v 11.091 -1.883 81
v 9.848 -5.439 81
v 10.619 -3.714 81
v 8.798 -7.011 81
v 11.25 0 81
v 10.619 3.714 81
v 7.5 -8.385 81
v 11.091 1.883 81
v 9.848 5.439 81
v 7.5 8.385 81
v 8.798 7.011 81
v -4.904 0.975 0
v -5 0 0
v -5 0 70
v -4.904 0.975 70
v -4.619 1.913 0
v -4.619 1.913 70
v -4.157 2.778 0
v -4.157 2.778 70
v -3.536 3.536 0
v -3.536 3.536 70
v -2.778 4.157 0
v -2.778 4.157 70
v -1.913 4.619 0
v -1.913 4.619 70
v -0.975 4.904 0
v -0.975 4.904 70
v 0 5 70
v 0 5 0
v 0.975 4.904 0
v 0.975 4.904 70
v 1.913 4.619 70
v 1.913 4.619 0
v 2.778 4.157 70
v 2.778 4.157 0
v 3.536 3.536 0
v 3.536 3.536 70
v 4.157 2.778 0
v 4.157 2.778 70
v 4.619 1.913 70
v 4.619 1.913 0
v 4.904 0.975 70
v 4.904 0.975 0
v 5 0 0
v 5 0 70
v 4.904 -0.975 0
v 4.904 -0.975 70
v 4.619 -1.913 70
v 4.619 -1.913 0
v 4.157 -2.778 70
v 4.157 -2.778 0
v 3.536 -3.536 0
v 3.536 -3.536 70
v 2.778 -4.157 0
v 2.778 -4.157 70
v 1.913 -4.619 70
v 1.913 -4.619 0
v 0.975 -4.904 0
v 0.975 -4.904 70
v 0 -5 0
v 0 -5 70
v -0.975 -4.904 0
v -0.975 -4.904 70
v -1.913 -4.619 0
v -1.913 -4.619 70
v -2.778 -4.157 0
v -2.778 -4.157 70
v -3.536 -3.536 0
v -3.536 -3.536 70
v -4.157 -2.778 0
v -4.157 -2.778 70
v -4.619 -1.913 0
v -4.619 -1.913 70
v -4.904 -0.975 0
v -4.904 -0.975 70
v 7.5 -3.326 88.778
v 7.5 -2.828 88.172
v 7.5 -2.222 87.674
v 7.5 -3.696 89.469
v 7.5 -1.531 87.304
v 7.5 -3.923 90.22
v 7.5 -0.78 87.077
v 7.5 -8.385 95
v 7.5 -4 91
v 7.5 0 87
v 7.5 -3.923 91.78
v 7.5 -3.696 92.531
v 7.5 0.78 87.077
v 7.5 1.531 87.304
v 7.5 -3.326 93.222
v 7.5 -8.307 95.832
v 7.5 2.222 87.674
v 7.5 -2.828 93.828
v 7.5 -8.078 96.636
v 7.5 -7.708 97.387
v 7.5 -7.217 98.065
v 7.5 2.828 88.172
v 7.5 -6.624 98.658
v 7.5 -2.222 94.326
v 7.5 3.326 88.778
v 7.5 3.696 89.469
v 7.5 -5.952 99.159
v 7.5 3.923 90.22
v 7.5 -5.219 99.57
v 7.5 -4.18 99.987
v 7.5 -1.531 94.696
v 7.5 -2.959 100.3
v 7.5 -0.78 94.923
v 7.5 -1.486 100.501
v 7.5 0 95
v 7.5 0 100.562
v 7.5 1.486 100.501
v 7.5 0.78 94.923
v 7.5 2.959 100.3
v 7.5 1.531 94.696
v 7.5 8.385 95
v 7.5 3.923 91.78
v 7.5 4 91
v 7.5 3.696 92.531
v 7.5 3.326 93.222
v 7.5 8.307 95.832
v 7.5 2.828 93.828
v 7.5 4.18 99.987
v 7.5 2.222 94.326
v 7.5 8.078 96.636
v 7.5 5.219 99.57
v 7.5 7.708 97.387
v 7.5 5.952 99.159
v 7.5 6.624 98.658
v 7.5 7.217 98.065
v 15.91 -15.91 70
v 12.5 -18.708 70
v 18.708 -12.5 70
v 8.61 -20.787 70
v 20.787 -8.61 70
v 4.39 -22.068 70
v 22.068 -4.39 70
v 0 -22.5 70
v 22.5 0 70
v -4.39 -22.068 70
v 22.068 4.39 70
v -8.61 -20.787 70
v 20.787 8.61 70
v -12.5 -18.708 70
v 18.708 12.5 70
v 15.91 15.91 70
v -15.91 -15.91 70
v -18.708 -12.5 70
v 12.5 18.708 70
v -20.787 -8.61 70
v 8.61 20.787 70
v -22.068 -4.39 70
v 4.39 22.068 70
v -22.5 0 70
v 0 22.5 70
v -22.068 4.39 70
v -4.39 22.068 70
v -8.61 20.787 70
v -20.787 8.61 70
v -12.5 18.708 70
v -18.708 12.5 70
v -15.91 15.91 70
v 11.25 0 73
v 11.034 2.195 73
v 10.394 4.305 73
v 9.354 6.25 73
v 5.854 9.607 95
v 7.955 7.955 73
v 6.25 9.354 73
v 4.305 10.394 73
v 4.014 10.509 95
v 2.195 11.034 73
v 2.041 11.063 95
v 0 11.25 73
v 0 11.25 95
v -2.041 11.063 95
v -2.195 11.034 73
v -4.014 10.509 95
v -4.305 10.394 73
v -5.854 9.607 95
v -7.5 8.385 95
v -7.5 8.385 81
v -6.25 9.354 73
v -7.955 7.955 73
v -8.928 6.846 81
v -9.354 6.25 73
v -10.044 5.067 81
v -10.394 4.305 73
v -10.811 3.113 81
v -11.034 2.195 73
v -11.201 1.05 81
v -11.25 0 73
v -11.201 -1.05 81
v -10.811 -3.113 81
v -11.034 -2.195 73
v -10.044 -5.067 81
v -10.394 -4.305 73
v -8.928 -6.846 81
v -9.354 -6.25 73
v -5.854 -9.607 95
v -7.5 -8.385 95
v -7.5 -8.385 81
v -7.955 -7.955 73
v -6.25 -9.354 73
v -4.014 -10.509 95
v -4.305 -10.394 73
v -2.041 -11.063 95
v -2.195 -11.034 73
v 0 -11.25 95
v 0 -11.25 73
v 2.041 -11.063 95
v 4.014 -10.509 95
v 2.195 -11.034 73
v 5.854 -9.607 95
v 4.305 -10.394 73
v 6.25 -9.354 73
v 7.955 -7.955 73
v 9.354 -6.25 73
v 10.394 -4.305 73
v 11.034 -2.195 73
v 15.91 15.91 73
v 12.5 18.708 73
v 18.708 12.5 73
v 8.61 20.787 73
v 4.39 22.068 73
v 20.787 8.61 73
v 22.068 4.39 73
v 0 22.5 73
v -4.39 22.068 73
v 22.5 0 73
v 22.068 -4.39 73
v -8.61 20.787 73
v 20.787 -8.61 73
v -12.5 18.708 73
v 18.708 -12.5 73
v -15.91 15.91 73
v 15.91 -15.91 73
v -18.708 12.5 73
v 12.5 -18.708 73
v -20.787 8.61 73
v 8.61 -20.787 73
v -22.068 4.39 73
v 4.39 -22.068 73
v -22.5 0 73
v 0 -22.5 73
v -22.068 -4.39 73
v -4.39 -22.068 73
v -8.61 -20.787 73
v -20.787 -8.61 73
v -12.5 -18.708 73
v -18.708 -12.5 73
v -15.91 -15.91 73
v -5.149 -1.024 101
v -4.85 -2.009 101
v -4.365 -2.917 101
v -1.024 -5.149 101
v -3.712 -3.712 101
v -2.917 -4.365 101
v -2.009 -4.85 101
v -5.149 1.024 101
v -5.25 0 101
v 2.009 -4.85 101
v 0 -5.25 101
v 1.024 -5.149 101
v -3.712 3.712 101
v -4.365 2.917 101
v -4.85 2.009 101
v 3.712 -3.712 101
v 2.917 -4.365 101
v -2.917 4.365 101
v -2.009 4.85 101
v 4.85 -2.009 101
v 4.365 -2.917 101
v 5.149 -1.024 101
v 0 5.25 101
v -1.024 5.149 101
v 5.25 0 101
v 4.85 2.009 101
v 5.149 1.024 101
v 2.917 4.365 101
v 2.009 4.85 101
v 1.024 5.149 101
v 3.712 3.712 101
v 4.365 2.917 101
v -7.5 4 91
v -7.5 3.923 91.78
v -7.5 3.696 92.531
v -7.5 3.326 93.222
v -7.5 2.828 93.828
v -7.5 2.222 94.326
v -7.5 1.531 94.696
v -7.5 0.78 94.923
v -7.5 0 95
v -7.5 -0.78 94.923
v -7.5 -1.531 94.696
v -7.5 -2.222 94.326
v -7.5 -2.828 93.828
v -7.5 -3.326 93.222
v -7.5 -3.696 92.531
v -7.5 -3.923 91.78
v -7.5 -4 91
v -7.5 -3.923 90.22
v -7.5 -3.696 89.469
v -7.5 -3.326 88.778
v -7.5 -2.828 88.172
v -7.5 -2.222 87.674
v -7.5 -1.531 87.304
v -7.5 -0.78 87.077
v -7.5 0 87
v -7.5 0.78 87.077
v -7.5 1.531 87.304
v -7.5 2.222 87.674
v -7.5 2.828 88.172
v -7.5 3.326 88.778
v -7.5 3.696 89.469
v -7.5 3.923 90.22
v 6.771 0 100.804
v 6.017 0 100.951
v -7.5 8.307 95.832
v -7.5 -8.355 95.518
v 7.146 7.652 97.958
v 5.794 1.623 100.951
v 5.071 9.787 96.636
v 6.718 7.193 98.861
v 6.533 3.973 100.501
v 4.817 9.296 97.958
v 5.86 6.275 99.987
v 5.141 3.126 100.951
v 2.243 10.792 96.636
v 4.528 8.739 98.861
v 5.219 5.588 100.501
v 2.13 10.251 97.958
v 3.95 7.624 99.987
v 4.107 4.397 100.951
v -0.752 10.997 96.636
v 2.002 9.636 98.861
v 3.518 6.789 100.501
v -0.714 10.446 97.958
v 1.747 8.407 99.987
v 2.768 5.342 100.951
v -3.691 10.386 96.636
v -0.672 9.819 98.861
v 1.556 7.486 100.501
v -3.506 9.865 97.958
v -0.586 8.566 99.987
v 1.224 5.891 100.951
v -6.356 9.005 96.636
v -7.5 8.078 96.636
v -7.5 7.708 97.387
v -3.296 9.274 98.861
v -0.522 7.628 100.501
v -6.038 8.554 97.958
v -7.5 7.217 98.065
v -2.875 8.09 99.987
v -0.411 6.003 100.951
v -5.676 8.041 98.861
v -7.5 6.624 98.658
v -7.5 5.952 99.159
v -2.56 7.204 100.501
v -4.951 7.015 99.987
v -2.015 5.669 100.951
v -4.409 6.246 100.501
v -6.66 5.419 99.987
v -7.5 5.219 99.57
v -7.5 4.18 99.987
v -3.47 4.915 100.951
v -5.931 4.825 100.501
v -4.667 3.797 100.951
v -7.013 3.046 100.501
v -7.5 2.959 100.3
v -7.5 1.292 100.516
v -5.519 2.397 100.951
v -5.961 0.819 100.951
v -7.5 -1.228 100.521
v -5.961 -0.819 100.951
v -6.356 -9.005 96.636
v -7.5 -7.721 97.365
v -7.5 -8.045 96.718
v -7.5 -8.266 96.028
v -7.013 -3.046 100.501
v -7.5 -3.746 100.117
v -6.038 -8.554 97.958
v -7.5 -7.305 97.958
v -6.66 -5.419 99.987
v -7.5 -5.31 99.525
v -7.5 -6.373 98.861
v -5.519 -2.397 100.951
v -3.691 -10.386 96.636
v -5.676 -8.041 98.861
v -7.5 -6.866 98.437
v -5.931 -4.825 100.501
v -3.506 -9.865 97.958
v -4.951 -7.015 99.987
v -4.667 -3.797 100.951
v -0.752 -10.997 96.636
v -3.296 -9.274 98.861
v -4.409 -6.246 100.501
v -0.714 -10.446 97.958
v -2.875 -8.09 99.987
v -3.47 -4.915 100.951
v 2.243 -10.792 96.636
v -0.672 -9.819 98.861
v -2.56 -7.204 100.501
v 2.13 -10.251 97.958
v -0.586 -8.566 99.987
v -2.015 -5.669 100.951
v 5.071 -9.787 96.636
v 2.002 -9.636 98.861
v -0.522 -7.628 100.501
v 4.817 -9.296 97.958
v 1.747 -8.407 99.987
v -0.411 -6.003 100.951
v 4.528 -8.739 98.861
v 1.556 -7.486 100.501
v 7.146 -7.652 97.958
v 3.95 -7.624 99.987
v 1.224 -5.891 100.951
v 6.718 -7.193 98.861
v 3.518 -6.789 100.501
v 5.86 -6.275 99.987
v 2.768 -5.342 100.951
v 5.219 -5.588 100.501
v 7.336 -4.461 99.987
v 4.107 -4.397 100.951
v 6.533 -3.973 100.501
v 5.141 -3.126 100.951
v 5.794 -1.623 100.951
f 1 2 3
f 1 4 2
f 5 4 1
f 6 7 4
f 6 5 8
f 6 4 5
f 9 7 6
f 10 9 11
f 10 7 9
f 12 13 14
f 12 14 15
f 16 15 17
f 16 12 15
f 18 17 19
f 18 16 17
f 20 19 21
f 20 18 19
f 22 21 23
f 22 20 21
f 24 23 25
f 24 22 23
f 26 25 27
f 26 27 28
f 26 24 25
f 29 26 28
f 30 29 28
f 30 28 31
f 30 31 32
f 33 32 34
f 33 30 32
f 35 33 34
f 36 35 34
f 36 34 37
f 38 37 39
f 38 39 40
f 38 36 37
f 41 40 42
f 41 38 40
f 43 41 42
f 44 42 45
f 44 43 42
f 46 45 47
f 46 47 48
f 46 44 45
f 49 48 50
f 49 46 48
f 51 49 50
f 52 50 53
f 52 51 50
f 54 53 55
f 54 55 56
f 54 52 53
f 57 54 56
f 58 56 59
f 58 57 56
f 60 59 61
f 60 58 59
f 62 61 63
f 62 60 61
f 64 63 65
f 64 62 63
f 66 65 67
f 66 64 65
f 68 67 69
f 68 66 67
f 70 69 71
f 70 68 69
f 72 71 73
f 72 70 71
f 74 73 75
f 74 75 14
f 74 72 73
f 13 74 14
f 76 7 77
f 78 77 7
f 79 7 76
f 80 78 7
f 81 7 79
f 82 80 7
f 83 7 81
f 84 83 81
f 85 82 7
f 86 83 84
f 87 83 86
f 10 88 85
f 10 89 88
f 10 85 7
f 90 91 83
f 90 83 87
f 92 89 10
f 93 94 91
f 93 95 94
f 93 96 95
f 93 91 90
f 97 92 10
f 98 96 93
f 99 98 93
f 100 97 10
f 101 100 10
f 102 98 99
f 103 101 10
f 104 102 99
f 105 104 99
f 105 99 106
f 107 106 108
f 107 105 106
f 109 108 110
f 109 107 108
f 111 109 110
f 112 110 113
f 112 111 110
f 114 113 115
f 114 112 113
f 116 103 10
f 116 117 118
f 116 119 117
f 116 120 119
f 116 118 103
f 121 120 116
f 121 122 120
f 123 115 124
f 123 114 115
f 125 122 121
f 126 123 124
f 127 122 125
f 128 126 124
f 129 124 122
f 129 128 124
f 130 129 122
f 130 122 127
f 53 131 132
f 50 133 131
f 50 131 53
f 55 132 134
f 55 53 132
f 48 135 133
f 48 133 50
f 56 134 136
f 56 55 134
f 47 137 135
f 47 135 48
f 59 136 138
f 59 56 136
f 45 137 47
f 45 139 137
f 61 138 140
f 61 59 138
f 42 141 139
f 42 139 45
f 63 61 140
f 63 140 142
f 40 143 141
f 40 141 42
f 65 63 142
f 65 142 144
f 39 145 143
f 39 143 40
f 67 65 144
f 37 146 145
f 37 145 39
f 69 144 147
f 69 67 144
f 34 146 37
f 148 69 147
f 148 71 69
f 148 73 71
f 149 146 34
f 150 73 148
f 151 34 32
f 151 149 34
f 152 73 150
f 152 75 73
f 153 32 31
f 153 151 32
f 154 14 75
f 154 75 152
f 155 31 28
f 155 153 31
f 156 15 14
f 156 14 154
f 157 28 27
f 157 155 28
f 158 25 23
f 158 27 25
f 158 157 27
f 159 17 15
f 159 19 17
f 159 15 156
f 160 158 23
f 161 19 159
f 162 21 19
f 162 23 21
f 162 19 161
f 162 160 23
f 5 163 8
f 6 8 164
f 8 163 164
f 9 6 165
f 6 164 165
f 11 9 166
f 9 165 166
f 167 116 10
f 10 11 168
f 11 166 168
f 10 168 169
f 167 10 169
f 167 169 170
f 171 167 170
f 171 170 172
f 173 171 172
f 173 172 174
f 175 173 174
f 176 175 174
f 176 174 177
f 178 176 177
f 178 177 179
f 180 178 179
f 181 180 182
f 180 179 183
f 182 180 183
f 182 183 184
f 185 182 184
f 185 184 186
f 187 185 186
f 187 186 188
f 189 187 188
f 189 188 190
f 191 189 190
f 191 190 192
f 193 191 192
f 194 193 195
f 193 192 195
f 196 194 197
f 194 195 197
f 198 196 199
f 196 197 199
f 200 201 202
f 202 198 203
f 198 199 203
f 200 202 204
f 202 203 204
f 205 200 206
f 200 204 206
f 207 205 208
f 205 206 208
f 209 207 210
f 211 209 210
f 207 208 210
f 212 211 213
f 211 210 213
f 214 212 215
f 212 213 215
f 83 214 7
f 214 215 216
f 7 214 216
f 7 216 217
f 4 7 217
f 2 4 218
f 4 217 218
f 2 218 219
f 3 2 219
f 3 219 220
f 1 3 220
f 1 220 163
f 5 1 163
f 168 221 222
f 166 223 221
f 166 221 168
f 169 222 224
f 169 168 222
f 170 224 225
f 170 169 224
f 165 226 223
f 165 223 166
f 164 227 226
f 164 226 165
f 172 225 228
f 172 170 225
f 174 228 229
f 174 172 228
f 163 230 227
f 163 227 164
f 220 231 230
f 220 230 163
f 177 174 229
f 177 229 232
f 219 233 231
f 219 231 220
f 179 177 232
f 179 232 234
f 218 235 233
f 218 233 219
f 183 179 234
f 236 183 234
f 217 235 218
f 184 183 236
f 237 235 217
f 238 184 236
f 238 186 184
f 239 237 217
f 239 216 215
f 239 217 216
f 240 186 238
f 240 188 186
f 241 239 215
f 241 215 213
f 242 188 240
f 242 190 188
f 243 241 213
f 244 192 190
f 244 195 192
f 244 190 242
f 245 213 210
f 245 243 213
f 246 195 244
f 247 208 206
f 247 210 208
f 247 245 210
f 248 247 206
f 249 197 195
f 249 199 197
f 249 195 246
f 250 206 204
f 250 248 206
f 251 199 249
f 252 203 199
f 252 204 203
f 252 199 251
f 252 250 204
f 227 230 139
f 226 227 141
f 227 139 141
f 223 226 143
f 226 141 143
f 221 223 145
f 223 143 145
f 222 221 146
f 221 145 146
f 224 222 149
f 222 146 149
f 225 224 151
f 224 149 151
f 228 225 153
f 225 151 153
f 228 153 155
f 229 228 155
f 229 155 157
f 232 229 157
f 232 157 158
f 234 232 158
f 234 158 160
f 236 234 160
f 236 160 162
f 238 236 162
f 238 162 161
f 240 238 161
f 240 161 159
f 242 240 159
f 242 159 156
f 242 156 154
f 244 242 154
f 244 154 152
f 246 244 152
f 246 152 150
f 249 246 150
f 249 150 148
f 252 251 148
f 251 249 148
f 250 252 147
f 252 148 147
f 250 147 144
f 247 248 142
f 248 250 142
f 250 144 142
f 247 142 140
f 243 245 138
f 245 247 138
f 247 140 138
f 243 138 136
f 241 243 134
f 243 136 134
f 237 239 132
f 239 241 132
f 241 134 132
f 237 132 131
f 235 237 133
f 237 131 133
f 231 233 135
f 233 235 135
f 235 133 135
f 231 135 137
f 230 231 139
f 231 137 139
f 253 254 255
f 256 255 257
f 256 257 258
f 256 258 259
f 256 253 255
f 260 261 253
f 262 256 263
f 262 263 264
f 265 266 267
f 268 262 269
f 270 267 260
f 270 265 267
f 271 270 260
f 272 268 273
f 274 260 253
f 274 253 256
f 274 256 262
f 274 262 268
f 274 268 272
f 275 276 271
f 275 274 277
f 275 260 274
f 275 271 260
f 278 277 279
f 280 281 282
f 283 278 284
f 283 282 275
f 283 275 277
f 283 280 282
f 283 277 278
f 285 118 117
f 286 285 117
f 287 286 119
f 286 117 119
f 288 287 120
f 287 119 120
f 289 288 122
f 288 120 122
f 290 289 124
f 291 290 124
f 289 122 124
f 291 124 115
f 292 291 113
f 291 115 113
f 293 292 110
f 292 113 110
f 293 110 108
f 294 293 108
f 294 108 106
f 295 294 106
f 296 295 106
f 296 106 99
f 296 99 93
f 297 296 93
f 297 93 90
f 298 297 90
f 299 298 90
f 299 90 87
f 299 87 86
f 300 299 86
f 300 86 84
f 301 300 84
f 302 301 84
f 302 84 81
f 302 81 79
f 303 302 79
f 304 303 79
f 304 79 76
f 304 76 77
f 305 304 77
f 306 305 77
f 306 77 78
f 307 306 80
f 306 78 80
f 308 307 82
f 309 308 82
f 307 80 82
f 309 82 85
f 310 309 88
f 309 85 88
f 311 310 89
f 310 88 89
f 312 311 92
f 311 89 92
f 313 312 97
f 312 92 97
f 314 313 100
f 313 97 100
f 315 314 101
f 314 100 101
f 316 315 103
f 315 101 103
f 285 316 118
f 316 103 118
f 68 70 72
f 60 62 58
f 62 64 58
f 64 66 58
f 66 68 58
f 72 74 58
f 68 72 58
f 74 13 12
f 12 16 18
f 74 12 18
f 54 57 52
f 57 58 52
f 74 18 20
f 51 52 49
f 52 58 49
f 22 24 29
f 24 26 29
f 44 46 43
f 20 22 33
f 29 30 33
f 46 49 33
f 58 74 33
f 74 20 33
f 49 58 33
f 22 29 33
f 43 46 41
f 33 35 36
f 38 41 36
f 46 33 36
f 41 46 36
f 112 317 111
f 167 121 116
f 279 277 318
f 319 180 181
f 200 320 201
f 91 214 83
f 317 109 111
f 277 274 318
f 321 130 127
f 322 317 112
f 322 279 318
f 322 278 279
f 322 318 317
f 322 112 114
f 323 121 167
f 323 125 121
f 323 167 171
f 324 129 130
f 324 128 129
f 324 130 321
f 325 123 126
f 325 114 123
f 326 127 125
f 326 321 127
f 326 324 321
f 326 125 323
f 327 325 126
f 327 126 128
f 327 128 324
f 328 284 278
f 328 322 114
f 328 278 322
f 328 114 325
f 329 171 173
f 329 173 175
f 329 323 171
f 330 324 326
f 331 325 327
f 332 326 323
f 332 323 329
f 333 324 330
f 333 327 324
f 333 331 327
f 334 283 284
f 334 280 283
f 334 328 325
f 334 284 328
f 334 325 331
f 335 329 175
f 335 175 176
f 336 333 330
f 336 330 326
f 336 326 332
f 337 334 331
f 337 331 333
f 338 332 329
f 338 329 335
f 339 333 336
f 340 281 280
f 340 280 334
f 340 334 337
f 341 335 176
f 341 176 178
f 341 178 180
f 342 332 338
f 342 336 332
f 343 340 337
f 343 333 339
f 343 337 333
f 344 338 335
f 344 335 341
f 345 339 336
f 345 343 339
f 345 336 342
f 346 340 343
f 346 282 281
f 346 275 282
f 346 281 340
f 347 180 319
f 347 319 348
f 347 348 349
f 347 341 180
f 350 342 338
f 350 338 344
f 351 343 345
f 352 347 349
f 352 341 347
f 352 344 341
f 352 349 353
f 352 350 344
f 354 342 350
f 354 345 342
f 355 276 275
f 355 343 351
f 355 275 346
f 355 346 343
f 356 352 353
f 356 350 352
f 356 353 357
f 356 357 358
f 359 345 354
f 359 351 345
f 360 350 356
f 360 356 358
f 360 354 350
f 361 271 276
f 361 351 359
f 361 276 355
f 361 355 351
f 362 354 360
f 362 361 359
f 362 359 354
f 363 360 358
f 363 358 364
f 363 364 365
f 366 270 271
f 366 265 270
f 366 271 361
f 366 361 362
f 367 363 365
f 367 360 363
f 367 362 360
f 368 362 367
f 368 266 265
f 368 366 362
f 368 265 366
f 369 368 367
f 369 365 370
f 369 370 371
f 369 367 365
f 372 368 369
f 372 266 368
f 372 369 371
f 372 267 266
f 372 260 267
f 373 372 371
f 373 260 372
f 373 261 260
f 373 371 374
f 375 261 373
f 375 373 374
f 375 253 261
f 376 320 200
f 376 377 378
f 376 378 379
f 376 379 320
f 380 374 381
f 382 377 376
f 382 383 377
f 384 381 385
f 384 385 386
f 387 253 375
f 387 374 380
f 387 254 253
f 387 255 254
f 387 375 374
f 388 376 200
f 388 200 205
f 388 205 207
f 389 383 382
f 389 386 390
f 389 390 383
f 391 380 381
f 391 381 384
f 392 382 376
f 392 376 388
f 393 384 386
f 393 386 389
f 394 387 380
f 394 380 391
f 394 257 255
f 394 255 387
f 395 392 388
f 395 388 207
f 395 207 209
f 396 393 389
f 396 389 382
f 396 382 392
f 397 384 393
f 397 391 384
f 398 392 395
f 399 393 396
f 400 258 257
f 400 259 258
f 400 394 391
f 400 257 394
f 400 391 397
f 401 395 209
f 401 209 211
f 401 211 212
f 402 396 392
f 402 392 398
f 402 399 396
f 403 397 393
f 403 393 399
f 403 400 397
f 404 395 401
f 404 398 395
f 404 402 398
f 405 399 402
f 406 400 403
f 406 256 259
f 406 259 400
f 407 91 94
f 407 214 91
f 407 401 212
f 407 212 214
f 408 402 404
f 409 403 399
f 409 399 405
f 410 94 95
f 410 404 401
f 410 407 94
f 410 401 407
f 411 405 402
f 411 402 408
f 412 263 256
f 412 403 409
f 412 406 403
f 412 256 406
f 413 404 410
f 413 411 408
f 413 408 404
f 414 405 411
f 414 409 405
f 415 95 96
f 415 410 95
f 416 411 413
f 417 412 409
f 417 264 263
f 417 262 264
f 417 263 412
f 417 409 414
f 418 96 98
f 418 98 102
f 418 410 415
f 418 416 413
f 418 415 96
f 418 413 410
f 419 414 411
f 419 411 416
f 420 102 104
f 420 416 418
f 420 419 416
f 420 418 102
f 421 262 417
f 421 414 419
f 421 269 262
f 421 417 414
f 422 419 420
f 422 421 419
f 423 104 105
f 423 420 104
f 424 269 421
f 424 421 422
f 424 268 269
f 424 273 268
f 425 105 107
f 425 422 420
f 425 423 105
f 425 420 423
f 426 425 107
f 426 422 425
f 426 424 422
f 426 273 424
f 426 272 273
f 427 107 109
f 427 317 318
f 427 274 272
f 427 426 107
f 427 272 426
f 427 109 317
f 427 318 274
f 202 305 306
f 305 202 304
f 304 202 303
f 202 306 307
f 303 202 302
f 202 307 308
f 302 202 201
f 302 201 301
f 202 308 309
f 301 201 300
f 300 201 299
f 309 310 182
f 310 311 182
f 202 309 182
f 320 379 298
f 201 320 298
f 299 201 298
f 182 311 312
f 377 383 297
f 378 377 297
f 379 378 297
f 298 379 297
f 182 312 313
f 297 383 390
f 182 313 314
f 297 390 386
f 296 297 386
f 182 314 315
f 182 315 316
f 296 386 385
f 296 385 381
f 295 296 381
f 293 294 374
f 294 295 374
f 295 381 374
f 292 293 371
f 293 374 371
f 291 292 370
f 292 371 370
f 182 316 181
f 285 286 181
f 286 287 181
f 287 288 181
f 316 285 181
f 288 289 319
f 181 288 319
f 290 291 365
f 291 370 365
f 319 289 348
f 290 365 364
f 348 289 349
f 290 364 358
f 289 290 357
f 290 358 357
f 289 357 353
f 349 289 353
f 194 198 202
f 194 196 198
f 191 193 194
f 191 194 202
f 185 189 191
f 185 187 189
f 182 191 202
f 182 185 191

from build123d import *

# Parameters (mm, degrees)
ESQUISSE1_R             = 22.5
BOSS_EXTRU_1_DEPTH      = 101
ESQUISSE2_R             = 22.5
ESQUISSE2_R_2           = 5
ENL_V_MAT_EXTRU_1_DEPTH = 70
ENL_V_START             = -28
ESQUISSE3_R             = 22.5
ESQUISSE3_R_2           = 11.25
ENL_V_MAT_EXTRU_2_DEPTH = 28
CONG_1_R                = 6
ESQUISSE6_W             = 6.909858745
ESQUISSE6_H             = 23.056365404
ENL_V_MAT_EXTRU_3_DEPTH = 20
ESQUISSE7_R             = 4
ENL_V_MAT_EXTRU_4_DEPTH = 108.736948259


with BuildPart() as part:
    # Esquisse1 → Boss.-Extru.1 (new body)
    with BuildSketch(Plane.XY):
        Circle(ESQUISSE1_R)
    extrude(amount=BOSS_EXTRU_1_DEPTH)

    # Esquisse2 → Enlèv. mat.-Extru.1 (cut)
    with BuildSketch(Plane(origin=(0, 0, 0), x_dir=(-1, 0, 0), z_dir=(0, 0, -1))):
        Circle(ESQUISSE2_R)
        Circle(ESQUISSE2_R_2, mode=Mode.SUBTRACT)
    extrude(amount=-ENL_V_MAT_EXTRU_1_DEPTH, mode=Mode.SUBTRACT)

    # Esquisse3 → Enlèv. mat.-Extru.2 (cut)
    with BuildSketch(Plane.XY.offset(101).offset(ENL_V_START)):
        with Locations(Location((0, 0, 0), (0, 0, 180))):
            Circle(ESQUISSE3_R)
        Circle(ESQUISSE3_R_2, mode=Mode.SUBTRACT)
    extrude(amount=ENL_V_MAT_EXTRU_2_DEPTH, mode=Mode.SUBTRACT)

    # Congé1
    cong_1_edges = [part.edges().sort_by_distance(p)[0] for p in [
        (-11.25, 0, 101),
    ]]
    fillet(cong_1_edges, radius=CONG_1_R)

    # Esquisse6 → Enlèv. mat.-Extru.3 (cut)
    with BuildSketch(Plane.XY.offset(101)):
        with Locations((10.954929373, 0)):
            Rectangle(ESQUISSE6_W, ESQUISSE6_H)
        with Locations((-10.954929373, 0)):
            Rectangle(ESQUISSE6_W, ESQUISSE6_H)
    extrude(amount=-ENL_V_MAT_EXTRU_3_DEPTH, mode=Mode.SUBTRACT)

    # Esquisse7 → Enlèv. mat.-Extru.4 (cut, through all)
    with BuildSketch(Plane(origin=(7.5, 0, 0), x_dir=(0, 0, -1), z_dir=(1, 0, 0))):
        with Locations(Location((-91, 0, 0), (0, 0, 90))):
            Circle(ESQUISSE7_R)
    extrude(amount=-ENL_V_MAT_EXTRU_4_DEPTH, mode=Mode.SUBTRACT)


solid = part.part
